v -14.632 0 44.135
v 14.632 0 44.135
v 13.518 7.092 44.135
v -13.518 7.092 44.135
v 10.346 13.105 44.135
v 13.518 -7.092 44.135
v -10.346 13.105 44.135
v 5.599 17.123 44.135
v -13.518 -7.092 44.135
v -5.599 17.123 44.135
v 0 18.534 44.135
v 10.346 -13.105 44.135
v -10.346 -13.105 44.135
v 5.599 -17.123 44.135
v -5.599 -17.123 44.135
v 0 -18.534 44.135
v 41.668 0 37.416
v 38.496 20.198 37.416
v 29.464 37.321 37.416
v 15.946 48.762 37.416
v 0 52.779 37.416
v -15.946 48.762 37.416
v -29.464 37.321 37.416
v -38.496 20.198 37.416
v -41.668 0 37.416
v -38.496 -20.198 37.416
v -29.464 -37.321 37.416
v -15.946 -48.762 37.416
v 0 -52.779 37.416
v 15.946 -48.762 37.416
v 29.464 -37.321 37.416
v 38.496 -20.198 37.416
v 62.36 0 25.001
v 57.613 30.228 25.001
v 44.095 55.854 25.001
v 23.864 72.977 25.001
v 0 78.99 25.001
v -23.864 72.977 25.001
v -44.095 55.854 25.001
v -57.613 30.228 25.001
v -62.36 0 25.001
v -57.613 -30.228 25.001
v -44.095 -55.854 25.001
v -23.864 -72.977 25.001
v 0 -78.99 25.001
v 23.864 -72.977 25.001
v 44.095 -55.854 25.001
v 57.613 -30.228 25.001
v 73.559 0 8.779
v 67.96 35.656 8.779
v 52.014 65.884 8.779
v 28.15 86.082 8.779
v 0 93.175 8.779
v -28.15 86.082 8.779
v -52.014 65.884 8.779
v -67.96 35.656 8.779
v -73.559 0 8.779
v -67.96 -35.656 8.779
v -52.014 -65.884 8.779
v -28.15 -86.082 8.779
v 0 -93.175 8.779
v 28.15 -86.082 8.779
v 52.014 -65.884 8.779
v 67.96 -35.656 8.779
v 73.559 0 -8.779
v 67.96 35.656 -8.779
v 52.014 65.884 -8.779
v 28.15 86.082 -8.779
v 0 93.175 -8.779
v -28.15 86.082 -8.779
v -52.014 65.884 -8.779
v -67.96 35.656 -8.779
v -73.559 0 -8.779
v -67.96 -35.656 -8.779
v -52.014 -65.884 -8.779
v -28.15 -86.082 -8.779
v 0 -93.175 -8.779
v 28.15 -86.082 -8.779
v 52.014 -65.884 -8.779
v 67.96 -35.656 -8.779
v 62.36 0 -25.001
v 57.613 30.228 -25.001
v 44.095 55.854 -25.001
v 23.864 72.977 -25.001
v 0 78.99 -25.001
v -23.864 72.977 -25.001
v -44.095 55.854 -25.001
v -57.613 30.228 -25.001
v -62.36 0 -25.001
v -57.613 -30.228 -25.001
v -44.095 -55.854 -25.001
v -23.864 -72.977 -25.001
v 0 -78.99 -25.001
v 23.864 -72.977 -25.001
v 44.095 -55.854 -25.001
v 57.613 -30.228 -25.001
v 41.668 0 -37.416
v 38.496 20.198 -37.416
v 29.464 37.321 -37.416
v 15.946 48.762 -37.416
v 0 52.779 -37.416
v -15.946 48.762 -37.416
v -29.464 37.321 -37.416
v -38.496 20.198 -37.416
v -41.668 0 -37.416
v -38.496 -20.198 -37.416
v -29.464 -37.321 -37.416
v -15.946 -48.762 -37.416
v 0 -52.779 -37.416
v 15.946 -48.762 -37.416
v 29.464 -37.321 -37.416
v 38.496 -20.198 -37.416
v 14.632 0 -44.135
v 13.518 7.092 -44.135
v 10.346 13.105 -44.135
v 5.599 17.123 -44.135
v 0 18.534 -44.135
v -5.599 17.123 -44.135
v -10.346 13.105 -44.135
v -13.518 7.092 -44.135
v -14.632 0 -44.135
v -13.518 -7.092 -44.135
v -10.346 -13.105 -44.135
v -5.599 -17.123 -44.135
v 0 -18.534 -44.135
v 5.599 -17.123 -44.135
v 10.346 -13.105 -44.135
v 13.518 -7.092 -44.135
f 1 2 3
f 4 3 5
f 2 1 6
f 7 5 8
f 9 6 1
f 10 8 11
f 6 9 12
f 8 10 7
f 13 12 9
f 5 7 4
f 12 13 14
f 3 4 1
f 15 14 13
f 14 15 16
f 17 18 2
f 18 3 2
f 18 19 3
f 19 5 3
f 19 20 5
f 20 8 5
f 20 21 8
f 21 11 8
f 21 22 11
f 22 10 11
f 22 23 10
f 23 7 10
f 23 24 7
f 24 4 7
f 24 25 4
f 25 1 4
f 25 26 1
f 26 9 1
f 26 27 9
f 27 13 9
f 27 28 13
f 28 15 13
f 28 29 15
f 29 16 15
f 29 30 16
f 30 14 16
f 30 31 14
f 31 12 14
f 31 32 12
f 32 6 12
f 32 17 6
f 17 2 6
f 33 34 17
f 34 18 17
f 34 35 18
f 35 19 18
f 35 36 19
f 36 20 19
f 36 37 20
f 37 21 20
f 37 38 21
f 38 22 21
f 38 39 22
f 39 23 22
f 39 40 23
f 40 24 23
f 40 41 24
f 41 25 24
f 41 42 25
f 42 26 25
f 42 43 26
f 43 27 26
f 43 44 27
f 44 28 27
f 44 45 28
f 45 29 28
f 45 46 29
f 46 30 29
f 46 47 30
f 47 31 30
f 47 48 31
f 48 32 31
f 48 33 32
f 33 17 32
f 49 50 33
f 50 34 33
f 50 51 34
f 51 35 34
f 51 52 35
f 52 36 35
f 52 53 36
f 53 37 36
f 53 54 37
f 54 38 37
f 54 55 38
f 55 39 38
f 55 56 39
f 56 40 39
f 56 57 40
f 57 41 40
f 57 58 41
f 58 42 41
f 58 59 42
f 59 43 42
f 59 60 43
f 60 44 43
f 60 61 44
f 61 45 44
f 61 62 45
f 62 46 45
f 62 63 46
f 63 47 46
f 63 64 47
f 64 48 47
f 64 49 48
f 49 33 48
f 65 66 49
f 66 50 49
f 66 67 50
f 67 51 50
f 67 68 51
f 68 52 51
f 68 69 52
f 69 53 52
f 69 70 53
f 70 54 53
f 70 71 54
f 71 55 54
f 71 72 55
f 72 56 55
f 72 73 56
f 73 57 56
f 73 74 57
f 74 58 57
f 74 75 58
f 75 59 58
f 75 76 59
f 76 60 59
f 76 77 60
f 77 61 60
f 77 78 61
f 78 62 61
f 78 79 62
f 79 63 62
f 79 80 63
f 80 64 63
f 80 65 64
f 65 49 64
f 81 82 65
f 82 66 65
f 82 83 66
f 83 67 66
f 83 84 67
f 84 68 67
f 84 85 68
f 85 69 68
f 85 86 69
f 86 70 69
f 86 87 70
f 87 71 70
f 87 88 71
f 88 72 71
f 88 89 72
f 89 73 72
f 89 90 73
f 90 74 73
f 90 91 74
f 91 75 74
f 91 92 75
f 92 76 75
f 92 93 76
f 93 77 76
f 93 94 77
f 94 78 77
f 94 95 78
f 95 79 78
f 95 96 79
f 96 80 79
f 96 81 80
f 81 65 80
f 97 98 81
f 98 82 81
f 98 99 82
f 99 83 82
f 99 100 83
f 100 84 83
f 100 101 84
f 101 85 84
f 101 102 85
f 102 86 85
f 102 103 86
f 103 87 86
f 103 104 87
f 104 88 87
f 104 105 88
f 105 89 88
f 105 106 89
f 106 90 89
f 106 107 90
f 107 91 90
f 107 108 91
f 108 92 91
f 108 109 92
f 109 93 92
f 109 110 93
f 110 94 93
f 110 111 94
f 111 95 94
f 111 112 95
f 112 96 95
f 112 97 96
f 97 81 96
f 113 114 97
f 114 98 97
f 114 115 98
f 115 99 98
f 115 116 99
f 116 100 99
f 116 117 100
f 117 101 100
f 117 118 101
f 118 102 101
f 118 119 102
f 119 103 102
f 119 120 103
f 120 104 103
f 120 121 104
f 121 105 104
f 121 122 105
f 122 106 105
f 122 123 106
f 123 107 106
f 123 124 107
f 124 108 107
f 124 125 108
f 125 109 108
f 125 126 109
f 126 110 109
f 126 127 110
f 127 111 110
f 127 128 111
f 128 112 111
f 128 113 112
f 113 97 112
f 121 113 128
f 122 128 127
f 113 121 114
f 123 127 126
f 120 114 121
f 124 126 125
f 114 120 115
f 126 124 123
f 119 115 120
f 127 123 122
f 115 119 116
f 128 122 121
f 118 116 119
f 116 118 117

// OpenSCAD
// Generated by SolidPython 1.0.1 on 2020-07-29 00:46:52


scale(v = [15, 19, 9]) {
	sphere(r = 5);
}
/***********************************************
*********      SolidPython code:      **********
************************************************
 
# import packages: SolidPython
from solid import *
from solid.utils import *
from itertools import chain, combinations, permutations


class Resize:

    def __init__(self, scad_file):
        self.scad_file = scad_file
        #self.scad_file = import_scad(scad_file)
        # cone/cylinder param:
        self.r1 = 0
        self.r2 = 0
        self.h = 0
        # rectangular prism param:
        self.w = 0
        self.l = 0
        # ellipse param:
        self.r = 0

    # import OpenScad code (file name corresponds to shape)


    # classify shape + parameters
    def assign(self, param1, param2, param3):
        if self.scad_file == 'cone.scad':
            self.r1 = param1
            self.r2 = param2
            self.h = param3
        elif self.scad_file == 'cylinder.scad':
            self.r1 = param1
            self.r2 = param2
            self.h = param3
        elif self.scad_file == 'rectangularPrism.scad':
            self.h = param1
            self.l = param2
            self.w = param3
        else:
            self.r = param1
            self.h = param2

    # resize parameters
    def iterate(self):
        x = range(3, 20, 2)
        i = 1
        if self.scad_file == 'cone.scad':
            tempList = list(permutations(x, 2))
            for temp in tempList:
                param1 = temp[0]
                param2 = temp[1]
                filepath = 'produced_scad_files/' + 'cone' + str(param1) + '_' + str(param2) + '_' + '.scad'
                scad_render_to_file(cylinder(h=param1, r1=param2, r2=0), filepath)

        elif self.scad_file == 'cylinder.scad':
            tempList = list(permutations(x, 3))
            for temp in tempList:
                param1 = temp[0]
                param2 = temp[1]
                filepath = 'produced_scad_files/' + 'cylinder' + str(param1) + '_' + str(param2) + '_' + '.scad'
                scad_render_to_file(cylinder(h=param1, r1=param2, r2=param2), filepath)

        elif self.scad_file == 'rectangularPrism.scad':
            tempList = list(permutations(x, 3))
            for temp in tempList:
                param1 = temp[0]
                param2 = temp[1]
                param3 = temp[2]
                filepath = 'produced_scad_files/' + 'rectangularPrism' + str(param1) + '_' + str(param2) + '_' + str(
                    param3) + '.scad'
                scad_render_to_file(cube(size=(param1, param2, param3)), filepath)

        elif self.scad_file == 'ellipse.scad':
            tempList = list(permutations(x, 4))
            for temp in tempList:
                param1 = temp[0]
                param2 = temp[1]
                param3 = temp[2]
                param4 = temp[3]
                filepath = 'produced_scad_files/' + 'ellipse' + str(param1) + '_' + str(param2) + '_' + str(param3) + '_' + str(param4) + '.scad'
                scad_render_to_file(scale([param1, param2, param3])(sphere(r=param4)), filepath)

    def render_to_scadfile(self):
        scad_render_to_file(scad, 'example.scad') 
 
************************************************/
